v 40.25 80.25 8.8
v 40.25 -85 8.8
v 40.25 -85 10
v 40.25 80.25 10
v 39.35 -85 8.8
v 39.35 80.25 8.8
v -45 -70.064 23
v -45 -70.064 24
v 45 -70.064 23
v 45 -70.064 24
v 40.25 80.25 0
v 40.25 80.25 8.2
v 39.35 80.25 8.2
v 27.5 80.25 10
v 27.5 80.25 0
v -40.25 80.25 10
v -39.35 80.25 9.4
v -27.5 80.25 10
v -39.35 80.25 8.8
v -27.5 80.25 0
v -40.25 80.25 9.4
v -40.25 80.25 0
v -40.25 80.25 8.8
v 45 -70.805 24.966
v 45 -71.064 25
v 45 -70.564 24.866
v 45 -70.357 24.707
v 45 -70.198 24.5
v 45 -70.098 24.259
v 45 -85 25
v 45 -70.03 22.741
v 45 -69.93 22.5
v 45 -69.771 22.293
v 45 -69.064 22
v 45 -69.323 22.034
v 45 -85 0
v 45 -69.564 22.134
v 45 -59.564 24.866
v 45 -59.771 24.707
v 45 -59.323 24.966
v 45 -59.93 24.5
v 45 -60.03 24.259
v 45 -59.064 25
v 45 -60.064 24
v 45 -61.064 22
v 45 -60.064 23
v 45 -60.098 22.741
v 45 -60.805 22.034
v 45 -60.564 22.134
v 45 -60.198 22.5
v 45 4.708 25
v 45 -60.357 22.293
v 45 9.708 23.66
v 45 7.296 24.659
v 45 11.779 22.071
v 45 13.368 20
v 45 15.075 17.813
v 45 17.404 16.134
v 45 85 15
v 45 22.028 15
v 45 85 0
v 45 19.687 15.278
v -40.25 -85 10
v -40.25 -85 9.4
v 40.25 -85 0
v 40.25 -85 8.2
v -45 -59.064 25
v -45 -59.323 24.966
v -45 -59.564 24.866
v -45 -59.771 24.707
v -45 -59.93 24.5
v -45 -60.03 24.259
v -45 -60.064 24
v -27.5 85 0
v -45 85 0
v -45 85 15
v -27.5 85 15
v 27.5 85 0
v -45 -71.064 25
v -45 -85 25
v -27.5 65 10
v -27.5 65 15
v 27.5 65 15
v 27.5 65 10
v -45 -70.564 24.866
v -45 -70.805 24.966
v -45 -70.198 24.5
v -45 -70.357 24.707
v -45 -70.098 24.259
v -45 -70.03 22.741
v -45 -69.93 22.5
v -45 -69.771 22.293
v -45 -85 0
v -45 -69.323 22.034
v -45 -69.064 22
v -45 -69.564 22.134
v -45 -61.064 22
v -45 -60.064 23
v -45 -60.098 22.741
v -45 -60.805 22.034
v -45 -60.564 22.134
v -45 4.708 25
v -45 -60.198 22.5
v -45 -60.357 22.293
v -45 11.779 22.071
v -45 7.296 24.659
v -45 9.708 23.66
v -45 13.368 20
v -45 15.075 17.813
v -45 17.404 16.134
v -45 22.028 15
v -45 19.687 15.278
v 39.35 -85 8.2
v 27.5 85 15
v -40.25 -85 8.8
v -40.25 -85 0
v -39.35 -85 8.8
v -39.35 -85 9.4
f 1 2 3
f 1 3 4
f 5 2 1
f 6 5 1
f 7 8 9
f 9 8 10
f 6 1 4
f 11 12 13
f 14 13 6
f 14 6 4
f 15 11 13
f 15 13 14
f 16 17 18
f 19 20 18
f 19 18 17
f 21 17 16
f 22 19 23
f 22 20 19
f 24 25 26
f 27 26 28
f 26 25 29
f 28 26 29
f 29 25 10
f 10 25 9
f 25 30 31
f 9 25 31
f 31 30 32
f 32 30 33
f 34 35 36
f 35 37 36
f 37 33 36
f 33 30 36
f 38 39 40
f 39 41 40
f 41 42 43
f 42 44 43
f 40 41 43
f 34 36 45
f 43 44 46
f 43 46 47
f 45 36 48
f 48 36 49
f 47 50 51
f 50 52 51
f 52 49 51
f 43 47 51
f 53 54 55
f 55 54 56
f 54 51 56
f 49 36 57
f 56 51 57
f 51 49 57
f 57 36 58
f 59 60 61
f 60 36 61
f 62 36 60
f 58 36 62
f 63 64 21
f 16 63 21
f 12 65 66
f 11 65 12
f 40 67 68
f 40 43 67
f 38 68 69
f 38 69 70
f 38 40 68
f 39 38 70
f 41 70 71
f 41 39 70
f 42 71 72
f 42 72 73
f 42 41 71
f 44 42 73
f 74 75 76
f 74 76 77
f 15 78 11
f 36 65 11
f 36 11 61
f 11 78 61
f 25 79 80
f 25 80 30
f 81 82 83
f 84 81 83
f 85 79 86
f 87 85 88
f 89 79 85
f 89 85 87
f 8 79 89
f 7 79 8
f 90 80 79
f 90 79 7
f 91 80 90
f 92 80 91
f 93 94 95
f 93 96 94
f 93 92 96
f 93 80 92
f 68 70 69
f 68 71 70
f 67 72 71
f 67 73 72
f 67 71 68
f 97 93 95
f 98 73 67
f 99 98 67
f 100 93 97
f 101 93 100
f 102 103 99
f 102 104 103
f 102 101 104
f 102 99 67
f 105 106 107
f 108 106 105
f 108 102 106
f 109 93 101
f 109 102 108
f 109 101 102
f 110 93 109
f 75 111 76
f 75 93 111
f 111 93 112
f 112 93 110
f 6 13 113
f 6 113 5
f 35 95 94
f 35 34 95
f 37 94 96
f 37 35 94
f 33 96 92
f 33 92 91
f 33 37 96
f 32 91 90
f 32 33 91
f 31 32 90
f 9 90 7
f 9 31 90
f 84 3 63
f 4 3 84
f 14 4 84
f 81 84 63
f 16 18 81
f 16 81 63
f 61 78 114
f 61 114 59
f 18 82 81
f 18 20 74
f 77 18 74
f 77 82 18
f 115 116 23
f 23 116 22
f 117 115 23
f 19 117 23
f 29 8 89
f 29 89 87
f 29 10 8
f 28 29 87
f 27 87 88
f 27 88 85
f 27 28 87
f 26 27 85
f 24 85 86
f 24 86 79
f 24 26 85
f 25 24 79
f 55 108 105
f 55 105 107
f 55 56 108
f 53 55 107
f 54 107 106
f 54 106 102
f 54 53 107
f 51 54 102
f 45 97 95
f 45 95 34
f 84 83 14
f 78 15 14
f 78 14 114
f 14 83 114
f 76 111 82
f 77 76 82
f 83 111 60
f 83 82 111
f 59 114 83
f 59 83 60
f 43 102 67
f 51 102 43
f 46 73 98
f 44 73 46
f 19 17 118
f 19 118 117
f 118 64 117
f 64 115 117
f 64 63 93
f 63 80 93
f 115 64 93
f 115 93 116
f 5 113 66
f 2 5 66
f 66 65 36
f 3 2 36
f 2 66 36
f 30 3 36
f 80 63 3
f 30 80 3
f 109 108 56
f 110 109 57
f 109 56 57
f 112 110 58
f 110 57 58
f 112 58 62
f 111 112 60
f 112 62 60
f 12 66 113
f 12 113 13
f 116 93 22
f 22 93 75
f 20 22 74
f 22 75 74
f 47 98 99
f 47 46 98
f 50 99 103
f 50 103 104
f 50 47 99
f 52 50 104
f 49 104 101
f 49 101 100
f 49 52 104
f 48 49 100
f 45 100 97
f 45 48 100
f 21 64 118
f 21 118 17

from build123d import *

# Parameters (mm, degrees)
SKETCH_1_W          = 90
SKETCH_1_H          = 170
EXTRUDE_1_DEPTH     = 25
SKETCH_2_W          = 90
SKETCH_2_H          = 70.292308138
CUT_EXTRUDE_1_DEPTH = 10
FILLET_1_R          = 10
FILLET_2_R          = 10
SKETCH_3_W          = 80.5
SKETCH_3_H          = 165.25
CUT_EXTRUDE_2_DEPTH = 10
SKETCH_5_W          = 0.6
SKETCH_5_H          = 165.25
EXTRUDE_2_DEPTH     = 0.9
SKETCH_6_W          = 0.6
SKETCH_6_H          = 165.25
EXTRUDE_3_DEPTH     = 0.9
SKETCH_9_W          = 90
SKETCH_9_H          = 10
CUT_EXTRUDE_5_DEPTH = 3
FILLET_8_R          = 1
FILLET_9_R          = 1
SKETCH_10_W         = 55
SKETCH_10_H         = 40
CUT_EXTRUDE_6_DEPTH = 20


with BuildPart() as part:
    # 草图1 → 凸台-拉伸1 (new body)
    with BuildSketch(Plane.XY):
        Rectangle(SKETCH_1_W, SKETCH_1_H)
    extrude(amount=EXTRUDE_1_DEPTH)

    # 草图2 → 切除-拉伸1 (cut)
    with BuildSketch(Plane.XY.offset(25)):
        with Locations((0, 49.853845931)):
            Rectangle(SKETCH_2_W, SKETCH_2_H)
    extrude(amount=-CUT_EXTRUDE_1_DEPTH, mode=Mode.SUBTRACT)

    # 圆角1
    fillet_1_edges = [part.edges().sort_by_distance(p)[0] for p in [
        (0, 14.707691862, 25),
    ]]
    fillet(fillet_1_edges, radius=FILLET_1_R - 0.0001)  # a hair under: the kernel refuses the full size

    # 圆角2
    fillet_2_edges = [part.edges().sort_by_distance(p)[0] for p in [
        (0, 14.707691862, 15),
    ]]
    fillet(fillet_2_edges, radius=FILLET_2_R)

    # 草图3 → 切除-拉伸2 (cut)
    with BuildSketch(Plane(origin=(0, 0, 0), x_dir=(-1, 0, 0), z_dir=(0, 0, -1))):
        with Locations((0, -2.375)):
            Rectangle(SKETCH_3_W, SKETCH_3_H)
    extrude(amount=-CUT_EXTRUDE_2_DEPTH, mode=Mode.SUBTRACT)

    # 草图5 → 凸台-拉伸2 (add)
    with BuildSketch(Plane.ZY.offset(-40.25)):
        with Locations((8.5, -2.375)):
            Rectangle(SKETCH_5_W, SKETCH_5_H)
    extrude(amount=EXTRUDE_2_DEPTH)

    # 草图6 → 凸台-拉伸3 (add)
    with BuildSketch(Plane(origin=(-40.25, 0, 0), x_dir=(0, 0, -1), z_dir=(1, 0, 0))):
        with Locations((-9.1, -2.375)):
            Rectangle(SKETCH_6_W, SKETCH_6_H)
    extrude(amount=EXTRUDE_3_DEPTH)

    # 草图9 → 切除-拉伸5 (cut)
    with BuildSketch(Plane.XY.offset(25)):
        with Locations((0, -65.064201391)):
            Rectangle(SKETCH_9_W, SKETCH_9_H)
    extrude(amount=-CUT_EXTRUDE_5_DEPTH, mode=Mode.SUBTRACT)

    # 圆角8
    fillet_8_edges = [part.edges().sort_by_distance(p)[0] for p in [
        (0, -60.064201391, 22),
        (0, -60.064201391, 25),
    ]]
    fillet(fillet_8_edges, radius=FILLET_8_R)

    # 圆角9
    fillet_9_edges = [part.edges().sort_by_distance(p)[0] for p in [
        (0, -70.064201391, 22),
        (0, -70.064201391, 25),
    ]]
    fillet(fillet_9_edges, radius=FILLET_9_R)

    # 草图10 → 切除-拉伸6 (cut)
    with BuildSketch(Plane.XY.offset(15)):
        with Locations((0, 85)):
            Rectangle(SKETCH_10_W, SKETCH_10_H)
    extrude(amount=-CUT_EXTRUDE_6_DEPTH, mode=Mode.SUBTRACT)


solid = part.part
